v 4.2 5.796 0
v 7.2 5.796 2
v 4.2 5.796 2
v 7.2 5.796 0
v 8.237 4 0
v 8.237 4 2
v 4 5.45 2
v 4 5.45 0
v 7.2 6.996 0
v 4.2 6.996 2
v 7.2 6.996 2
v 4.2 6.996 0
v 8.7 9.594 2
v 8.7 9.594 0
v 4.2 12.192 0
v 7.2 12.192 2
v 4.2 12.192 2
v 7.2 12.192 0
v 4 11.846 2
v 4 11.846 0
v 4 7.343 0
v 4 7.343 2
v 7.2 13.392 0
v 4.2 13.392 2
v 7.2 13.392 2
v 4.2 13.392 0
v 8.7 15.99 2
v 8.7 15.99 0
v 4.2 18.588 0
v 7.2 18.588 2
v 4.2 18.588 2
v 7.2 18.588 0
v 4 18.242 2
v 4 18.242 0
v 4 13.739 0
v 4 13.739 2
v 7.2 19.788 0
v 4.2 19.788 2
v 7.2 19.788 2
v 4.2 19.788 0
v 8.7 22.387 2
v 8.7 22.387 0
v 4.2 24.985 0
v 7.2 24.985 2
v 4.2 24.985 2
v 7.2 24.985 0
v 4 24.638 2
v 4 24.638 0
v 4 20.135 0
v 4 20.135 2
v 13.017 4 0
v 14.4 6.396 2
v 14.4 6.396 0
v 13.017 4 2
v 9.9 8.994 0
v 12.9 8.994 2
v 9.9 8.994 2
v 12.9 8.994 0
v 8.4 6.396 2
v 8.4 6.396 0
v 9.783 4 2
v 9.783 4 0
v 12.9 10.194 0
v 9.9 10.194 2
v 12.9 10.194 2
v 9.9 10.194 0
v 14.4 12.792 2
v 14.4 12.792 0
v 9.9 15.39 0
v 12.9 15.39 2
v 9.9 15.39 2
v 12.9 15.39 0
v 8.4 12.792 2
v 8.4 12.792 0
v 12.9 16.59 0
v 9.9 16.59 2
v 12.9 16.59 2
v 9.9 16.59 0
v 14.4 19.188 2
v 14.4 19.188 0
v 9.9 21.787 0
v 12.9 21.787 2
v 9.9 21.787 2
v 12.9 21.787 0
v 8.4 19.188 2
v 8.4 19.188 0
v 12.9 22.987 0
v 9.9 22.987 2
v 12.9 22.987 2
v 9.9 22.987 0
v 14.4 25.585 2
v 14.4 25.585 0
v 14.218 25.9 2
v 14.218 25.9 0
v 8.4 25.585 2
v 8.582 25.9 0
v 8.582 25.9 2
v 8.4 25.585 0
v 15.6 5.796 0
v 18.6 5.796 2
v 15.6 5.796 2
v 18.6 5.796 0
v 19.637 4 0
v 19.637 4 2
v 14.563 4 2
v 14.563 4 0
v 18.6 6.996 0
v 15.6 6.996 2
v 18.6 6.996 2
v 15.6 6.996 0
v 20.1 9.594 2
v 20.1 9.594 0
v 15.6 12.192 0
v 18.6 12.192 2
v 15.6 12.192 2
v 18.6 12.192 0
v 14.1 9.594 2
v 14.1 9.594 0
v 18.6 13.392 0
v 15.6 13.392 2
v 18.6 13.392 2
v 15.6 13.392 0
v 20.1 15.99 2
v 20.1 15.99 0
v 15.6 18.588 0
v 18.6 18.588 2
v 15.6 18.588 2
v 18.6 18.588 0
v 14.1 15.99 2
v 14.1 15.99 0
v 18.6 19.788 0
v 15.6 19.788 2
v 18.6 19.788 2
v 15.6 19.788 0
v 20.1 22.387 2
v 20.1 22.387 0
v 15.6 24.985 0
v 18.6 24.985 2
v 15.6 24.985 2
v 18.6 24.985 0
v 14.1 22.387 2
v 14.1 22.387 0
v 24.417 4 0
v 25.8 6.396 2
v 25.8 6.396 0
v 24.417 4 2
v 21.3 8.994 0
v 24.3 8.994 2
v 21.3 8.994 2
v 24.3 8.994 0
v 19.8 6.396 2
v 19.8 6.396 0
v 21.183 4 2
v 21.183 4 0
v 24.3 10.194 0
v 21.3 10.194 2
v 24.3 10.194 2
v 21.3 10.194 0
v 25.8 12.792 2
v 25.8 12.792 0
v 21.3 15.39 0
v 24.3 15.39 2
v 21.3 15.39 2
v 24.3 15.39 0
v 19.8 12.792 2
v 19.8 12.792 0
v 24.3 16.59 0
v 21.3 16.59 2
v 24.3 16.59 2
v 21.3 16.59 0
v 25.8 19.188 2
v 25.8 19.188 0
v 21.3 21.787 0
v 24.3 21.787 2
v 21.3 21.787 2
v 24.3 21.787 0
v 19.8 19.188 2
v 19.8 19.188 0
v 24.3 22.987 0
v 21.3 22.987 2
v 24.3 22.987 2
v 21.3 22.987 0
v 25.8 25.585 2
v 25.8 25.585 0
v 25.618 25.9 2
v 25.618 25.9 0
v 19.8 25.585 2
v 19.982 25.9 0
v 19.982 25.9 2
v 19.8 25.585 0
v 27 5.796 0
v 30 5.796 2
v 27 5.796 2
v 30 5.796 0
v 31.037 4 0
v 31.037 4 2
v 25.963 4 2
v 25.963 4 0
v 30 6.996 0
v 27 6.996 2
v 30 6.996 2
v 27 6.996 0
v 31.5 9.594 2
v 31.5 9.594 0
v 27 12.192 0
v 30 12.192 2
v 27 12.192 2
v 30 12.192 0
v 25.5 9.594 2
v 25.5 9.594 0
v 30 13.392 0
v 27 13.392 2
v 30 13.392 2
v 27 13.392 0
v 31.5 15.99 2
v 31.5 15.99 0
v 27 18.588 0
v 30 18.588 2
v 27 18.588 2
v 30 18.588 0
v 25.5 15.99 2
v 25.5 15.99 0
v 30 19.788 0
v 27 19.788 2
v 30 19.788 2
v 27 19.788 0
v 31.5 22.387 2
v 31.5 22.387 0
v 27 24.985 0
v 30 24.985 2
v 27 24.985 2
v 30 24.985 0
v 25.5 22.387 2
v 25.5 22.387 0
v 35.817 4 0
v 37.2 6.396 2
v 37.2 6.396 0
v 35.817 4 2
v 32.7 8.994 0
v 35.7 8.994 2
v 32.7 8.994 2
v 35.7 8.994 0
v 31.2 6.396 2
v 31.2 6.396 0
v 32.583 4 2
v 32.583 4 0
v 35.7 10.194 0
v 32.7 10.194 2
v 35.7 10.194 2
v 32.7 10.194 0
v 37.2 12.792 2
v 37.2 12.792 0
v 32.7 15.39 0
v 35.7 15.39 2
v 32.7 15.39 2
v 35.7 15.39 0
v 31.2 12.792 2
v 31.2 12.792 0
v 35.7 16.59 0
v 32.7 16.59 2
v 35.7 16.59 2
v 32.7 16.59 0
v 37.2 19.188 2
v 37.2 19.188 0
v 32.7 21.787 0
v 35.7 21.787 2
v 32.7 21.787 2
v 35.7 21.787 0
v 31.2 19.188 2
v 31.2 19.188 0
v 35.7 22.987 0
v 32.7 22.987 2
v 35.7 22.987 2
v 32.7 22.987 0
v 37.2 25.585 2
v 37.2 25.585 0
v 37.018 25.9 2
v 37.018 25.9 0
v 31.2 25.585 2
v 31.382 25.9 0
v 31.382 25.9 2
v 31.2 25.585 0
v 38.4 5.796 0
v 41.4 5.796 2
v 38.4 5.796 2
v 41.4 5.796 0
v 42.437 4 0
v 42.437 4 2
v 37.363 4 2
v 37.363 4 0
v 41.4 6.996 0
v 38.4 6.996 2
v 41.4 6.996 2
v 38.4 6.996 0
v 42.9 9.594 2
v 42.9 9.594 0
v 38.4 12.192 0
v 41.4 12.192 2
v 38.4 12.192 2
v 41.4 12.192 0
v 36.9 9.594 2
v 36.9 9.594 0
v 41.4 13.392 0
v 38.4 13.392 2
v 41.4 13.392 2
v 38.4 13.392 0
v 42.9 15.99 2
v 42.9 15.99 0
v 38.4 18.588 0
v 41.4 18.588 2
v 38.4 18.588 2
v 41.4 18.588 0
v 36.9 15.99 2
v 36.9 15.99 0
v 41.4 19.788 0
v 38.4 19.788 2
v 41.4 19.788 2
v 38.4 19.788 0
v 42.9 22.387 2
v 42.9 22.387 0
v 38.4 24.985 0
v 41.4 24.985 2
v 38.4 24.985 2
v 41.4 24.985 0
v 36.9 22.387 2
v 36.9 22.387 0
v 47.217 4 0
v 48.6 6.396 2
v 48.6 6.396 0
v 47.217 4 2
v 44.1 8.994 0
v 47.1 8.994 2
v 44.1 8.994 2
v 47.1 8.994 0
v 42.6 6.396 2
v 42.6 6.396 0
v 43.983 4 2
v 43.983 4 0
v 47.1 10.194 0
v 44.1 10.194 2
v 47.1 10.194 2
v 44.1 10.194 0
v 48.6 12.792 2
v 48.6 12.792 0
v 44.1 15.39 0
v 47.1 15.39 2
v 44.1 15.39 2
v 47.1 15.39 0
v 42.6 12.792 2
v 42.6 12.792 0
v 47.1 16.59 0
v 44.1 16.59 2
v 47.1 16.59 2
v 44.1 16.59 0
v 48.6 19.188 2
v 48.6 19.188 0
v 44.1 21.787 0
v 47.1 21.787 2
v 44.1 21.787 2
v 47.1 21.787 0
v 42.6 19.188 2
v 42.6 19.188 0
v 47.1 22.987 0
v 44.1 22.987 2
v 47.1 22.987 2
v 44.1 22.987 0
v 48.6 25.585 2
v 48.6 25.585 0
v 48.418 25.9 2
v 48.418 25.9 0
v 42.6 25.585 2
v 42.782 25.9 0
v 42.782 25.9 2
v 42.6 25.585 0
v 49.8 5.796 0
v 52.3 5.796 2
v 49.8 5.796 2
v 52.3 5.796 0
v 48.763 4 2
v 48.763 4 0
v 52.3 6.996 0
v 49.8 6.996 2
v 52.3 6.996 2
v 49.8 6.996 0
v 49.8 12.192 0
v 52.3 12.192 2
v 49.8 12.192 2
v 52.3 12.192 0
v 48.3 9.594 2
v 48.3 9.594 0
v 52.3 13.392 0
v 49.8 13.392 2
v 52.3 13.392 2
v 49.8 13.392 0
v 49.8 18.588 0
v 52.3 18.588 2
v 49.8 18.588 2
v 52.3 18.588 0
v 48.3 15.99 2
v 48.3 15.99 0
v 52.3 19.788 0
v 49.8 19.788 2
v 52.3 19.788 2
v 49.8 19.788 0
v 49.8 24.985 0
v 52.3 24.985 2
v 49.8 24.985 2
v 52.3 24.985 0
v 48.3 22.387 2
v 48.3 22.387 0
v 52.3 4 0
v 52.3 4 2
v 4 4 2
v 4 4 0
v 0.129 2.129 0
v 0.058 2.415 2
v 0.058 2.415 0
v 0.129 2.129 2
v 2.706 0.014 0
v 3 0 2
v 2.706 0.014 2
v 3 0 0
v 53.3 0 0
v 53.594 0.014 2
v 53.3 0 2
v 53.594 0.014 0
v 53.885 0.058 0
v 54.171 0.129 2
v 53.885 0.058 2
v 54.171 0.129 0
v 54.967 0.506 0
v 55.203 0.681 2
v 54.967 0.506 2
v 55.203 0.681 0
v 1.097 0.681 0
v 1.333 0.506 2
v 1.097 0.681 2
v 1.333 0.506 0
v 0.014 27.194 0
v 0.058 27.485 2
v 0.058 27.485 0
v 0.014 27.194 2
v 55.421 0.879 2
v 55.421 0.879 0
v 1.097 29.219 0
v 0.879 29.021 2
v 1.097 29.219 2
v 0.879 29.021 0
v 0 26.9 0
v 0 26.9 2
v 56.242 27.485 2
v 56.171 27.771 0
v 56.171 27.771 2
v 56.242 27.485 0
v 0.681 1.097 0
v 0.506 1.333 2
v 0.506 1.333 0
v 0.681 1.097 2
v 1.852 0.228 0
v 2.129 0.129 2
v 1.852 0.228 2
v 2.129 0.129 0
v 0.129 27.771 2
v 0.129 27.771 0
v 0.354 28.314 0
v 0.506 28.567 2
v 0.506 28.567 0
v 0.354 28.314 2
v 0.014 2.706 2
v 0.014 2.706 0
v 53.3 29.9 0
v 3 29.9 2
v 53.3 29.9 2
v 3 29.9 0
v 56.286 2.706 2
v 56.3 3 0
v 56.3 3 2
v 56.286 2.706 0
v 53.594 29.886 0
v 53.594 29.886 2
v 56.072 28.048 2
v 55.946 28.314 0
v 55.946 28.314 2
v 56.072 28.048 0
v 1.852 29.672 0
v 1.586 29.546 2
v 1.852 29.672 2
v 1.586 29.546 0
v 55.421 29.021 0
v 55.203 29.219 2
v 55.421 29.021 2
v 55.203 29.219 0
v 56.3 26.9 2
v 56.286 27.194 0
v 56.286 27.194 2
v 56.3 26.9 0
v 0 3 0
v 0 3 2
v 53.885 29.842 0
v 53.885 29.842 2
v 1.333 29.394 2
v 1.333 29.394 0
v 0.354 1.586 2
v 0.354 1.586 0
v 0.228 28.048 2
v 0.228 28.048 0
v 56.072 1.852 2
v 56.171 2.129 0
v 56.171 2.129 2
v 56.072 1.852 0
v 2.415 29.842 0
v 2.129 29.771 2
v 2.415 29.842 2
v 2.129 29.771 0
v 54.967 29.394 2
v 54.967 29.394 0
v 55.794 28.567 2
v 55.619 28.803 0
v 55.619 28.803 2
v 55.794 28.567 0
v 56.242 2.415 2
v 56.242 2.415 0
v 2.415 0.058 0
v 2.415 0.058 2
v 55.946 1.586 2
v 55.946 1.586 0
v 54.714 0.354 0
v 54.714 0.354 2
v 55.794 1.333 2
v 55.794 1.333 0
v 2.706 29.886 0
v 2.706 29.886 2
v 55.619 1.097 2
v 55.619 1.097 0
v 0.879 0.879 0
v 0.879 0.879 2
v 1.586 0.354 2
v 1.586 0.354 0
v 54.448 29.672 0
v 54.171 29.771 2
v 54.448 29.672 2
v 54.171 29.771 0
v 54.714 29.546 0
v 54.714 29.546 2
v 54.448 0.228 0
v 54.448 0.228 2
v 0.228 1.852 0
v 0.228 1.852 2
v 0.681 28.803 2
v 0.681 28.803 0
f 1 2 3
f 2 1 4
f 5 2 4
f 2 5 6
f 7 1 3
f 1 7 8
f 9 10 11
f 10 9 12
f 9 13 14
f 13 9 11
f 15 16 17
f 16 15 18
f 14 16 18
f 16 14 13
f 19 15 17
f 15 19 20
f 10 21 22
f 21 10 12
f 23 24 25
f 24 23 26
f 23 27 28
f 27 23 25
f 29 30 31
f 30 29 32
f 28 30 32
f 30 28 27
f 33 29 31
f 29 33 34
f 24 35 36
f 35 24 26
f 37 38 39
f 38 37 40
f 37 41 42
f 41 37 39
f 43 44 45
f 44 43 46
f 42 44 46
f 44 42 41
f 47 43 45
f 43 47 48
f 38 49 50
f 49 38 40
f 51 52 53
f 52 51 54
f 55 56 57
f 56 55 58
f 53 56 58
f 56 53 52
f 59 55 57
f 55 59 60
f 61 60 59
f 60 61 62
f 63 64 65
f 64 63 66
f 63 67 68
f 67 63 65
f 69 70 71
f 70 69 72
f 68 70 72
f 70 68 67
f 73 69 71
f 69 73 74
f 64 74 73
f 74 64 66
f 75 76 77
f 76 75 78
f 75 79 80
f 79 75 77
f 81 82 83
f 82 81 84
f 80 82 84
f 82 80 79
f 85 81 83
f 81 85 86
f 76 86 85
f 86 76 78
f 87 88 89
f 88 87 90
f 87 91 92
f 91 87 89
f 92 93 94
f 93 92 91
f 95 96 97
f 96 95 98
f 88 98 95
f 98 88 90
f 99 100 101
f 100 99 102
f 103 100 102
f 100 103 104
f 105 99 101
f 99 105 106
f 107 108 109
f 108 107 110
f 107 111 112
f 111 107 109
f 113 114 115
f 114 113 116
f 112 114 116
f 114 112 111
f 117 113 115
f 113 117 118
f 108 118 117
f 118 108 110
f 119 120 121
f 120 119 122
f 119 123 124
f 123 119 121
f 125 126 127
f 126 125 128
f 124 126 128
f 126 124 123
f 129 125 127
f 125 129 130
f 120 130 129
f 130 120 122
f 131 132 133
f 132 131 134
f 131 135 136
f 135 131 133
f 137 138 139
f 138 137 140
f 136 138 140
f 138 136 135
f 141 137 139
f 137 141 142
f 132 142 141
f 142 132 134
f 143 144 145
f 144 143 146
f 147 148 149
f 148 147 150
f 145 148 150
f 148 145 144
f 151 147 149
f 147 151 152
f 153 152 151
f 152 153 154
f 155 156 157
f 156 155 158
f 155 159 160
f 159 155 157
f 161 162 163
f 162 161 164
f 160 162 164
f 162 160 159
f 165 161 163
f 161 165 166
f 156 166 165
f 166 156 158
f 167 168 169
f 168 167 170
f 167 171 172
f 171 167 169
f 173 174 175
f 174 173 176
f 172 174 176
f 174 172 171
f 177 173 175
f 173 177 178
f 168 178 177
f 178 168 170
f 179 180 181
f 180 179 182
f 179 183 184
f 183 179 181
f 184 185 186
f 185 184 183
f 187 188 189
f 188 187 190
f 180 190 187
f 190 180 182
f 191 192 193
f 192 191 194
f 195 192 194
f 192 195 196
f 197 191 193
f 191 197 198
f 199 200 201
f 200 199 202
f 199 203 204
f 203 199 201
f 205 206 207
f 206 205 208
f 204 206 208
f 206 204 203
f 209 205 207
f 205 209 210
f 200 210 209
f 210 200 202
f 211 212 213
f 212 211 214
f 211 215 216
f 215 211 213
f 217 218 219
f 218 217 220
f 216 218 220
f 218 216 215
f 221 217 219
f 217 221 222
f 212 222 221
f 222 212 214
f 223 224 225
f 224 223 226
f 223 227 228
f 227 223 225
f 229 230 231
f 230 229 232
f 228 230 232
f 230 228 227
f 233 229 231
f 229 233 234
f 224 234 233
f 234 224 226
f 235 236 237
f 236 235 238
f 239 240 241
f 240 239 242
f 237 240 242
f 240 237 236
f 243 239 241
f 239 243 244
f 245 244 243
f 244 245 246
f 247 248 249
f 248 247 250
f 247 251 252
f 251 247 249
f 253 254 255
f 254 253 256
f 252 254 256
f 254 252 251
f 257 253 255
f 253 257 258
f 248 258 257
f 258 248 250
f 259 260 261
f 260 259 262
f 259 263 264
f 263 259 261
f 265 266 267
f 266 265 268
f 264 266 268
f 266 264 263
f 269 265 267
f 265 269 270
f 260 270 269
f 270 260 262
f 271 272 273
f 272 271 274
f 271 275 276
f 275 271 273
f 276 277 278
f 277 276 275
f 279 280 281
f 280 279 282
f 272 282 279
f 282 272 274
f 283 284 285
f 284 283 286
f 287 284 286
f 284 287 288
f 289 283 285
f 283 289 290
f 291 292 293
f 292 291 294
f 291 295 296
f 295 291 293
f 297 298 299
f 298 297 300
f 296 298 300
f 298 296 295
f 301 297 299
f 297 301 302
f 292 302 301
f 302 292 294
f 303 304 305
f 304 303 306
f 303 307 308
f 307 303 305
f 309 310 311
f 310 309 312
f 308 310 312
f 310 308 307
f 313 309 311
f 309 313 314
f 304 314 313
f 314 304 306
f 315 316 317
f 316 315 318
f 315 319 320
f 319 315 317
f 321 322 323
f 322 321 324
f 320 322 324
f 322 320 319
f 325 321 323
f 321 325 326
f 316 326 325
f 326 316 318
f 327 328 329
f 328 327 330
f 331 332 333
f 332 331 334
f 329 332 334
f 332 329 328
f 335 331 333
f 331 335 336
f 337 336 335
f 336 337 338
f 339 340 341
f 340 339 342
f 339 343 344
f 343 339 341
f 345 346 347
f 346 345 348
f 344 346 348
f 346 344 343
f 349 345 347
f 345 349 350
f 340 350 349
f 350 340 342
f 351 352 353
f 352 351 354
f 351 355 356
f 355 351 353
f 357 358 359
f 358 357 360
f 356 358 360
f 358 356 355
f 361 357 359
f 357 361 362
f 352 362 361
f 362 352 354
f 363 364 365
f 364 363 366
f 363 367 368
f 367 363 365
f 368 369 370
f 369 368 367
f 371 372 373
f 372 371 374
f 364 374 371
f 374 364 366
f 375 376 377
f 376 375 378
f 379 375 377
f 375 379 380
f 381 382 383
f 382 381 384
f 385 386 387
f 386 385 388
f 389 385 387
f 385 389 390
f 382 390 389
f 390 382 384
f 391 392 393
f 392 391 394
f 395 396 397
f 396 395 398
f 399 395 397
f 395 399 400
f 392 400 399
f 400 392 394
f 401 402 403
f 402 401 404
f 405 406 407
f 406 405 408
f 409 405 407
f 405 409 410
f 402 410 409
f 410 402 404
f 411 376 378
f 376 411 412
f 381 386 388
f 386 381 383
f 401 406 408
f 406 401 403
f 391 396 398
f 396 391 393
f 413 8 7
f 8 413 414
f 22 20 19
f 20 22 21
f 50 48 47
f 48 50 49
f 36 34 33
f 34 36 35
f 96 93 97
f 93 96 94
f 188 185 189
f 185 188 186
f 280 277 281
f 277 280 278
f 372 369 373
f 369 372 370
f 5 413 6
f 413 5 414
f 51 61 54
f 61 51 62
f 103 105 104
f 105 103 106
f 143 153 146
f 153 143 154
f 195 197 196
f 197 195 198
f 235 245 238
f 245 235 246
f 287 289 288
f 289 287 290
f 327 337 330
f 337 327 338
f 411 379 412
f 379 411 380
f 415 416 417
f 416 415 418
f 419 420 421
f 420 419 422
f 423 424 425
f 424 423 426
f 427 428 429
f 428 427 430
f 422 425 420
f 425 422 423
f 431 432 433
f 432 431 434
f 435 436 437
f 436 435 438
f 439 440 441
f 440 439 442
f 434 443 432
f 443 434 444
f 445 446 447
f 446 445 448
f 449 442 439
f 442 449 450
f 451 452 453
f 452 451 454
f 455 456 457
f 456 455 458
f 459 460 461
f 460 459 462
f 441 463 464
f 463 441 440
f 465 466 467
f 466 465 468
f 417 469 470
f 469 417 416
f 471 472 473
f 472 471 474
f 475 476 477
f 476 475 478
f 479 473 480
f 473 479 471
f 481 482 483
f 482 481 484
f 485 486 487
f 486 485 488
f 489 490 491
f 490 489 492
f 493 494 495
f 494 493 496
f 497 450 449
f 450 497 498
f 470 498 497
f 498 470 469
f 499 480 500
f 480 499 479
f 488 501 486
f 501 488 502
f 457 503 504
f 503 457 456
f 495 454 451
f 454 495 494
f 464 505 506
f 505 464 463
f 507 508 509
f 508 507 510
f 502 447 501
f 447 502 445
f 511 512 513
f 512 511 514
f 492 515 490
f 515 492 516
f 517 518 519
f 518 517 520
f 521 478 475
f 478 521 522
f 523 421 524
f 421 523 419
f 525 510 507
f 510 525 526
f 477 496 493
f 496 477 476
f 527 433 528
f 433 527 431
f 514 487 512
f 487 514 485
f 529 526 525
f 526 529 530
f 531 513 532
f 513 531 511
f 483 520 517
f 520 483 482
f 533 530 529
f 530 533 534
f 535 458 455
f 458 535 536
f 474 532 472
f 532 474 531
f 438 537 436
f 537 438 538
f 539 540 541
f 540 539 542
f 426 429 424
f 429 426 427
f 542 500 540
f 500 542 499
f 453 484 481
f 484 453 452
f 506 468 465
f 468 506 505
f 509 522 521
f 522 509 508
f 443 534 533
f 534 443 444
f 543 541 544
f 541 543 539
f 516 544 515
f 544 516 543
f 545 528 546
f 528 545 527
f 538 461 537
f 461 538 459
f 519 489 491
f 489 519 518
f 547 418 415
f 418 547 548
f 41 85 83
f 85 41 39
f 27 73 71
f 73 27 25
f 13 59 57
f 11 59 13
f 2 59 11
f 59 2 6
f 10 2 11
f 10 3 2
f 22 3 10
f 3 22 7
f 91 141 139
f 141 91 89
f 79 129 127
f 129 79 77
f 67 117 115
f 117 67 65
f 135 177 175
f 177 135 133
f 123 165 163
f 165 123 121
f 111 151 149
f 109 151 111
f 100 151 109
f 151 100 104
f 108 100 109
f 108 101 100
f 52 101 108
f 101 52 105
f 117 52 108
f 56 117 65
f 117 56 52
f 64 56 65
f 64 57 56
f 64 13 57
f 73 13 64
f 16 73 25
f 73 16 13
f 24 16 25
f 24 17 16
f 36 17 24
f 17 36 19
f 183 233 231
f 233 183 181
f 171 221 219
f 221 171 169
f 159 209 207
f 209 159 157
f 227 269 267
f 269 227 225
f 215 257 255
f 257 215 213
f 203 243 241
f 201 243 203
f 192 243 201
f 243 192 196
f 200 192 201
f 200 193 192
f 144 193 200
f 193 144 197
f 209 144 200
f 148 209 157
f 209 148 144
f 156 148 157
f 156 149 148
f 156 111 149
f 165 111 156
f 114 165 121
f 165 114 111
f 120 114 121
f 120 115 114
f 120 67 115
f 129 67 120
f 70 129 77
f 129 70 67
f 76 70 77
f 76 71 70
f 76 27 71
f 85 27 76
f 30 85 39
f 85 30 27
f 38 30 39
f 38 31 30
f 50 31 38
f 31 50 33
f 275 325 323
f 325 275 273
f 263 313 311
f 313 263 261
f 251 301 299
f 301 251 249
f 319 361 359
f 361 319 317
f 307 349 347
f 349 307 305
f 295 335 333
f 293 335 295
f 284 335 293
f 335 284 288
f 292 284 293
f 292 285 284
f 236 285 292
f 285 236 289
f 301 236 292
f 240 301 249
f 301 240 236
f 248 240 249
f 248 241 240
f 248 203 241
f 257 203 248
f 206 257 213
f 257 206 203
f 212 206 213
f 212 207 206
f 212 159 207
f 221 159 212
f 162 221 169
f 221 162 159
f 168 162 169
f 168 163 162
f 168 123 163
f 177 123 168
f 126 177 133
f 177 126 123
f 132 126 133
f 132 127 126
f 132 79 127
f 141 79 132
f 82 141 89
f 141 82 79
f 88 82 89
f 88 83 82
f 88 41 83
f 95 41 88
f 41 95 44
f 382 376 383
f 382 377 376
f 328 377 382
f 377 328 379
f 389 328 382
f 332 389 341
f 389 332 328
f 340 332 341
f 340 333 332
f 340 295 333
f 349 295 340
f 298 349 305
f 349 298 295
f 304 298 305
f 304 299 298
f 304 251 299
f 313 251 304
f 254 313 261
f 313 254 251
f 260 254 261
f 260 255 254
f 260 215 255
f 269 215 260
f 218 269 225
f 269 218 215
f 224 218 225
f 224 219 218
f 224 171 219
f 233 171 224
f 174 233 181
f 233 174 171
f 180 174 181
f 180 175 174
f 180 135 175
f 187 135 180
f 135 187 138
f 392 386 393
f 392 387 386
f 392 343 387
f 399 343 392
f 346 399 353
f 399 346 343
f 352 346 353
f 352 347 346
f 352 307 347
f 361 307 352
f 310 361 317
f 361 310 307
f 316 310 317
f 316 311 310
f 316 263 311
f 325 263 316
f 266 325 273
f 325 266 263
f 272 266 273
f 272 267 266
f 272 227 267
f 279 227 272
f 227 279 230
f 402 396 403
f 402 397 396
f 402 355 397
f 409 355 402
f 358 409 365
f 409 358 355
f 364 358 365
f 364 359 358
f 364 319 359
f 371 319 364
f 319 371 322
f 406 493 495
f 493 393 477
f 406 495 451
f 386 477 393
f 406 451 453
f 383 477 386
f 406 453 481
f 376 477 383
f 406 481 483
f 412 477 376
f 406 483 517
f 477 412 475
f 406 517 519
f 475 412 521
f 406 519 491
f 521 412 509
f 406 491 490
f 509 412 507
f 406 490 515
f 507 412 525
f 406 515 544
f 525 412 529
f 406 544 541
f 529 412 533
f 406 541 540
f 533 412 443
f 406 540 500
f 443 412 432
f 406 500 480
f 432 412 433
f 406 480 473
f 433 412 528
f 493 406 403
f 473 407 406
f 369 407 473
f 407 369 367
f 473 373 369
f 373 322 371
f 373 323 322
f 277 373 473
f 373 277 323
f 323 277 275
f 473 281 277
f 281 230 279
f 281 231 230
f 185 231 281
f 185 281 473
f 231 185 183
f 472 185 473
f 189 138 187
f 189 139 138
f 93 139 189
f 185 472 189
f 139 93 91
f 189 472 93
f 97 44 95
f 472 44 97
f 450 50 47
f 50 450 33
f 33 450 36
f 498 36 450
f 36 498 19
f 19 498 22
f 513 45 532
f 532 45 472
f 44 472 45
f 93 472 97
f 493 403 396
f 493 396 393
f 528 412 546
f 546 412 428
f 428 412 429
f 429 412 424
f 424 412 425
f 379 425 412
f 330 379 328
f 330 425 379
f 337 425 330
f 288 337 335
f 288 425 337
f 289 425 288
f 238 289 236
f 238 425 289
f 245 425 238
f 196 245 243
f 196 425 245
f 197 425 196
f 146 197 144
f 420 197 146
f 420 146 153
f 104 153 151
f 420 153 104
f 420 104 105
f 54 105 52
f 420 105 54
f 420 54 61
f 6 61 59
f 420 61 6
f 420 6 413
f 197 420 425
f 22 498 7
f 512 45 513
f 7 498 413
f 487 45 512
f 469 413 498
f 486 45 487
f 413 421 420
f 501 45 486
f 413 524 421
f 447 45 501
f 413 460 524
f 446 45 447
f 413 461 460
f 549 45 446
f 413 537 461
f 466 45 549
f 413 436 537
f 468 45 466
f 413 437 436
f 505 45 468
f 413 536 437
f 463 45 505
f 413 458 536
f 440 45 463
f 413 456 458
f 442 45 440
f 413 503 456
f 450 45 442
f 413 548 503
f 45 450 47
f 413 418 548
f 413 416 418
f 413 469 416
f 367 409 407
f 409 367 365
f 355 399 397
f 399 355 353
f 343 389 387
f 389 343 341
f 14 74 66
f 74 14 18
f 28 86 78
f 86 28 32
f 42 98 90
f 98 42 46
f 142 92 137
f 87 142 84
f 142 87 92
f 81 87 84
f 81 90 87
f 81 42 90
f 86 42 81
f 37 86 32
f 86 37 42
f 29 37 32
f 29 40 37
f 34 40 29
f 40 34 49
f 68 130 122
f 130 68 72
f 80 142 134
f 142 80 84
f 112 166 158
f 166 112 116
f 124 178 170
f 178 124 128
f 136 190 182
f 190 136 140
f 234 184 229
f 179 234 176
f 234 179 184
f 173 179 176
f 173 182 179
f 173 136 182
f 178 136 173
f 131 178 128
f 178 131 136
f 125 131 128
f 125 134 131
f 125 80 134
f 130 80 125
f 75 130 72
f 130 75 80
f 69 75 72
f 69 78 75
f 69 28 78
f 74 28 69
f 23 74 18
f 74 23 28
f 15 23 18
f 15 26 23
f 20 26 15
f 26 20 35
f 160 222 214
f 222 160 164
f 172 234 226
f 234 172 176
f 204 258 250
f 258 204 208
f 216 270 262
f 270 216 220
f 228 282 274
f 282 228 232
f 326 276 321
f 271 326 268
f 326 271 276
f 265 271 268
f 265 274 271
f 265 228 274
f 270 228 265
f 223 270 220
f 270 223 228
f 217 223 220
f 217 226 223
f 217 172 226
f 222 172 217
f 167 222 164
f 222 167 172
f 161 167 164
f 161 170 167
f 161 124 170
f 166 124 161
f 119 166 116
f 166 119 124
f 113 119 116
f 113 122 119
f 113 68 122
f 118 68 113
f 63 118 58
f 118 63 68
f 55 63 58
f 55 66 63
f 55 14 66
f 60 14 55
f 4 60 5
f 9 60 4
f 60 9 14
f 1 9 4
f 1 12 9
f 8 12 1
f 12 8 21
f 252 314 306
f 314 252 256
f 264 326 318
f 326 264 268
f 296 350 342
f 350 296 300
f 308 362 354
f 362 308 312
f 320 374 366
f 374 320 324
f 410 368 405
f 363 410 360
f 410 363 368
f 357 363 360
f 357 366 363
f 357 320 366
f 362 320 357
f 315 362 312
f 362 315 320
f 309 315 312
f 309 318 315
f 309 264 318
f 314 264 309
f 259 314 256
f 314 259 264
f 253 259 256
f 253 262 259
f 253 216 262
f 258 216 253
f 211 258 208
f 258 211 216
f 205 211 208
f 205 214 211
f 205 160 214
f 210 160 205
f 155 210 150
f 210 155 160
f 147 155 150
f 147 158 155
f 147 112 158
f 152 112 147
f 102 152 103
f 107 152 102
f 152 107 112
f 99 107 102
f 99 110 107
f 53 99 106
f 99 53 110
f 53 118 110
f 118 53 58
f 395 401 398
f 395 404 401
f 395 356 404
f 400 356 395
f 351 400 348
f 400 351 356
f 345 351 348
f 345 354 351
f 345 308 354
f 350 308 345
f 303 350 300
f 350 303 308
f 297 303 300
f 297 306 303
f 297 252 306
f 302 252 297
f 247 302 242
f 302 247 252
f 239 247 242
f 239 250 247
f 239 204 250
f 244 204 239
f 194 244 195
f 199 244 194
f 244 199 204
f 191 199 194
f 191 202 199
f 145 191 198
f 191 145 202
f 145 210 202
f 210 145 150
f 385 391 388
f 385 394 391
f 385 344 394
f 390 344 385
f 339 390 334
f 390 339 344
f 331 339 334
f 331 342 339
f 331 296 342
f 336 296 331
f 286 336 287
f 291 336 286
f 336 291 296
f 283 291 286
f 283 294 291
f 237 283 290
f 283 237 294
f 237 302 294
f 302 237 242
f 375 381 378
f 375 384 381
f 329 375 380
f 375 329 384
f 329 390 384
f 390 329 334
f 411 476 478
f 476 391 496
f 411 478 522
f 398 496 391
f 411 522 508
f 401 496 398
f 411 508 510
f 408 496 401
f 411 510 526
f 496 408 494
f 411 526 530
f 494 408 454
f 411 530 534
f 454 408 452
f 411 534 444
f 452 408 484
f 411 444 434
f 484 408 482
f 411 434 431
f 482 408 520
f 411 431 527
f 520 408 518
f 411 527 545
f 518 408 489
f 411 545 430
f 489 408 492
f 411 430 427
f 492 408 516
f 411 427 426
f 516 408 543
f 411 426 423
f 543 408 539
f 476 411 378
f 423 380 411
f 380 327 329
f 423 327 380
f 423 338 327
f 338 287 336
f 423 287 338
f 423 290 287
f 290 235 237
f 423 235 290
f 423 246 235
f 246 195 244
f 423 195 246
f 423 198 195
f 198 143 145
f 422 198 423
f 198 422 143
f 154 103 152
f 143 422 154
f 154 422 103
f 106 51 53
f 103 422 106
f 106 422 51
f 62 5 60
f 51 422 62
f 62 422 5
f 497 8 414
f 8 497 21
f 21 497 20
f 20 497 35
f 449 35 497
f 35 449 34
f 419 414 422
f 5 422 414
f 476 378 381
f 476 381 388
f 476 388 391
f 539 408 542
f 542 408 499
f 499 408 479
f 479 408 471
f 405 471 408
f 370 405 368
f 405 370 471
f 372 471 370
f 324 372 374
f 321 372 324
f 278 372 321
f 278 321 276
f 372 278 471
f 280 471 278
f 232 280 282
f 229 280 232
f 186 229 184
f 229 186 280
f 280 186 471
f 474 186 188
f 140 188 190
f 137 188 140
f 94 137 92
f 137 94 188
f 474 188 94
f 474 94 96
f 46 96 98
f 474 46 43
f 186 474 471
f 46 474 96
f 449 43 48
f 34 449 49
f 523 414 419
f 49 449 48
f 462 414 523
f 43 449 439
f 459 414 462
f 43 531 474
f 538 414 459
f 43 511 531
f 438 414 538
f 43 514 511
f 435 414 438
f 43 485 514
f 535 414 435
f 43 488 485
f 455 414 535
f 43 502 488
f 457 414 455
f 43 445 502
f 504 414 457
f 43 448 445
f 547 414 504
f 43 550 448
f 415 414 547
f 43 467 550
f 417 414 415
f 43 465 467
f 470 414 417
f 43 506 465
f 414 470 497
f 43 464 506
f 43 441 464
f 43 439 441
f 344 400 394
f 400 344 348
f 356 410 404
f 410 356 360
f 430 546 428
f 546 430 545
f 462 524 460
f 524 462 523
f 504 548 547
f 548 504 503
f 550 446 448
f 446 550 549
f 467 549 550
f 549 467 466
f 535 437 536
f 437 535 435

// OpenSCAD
// Honeycomb panel prototype — to choose cell size / density for the case back.
// Reusable: the hex_panel() module gets lifted into the real back cover later.
// Render a density with:  openscad -D hole_r=4.5 ...

W        = 56.3;   // back-cover-ish width
H        = 29.9;   // back-cover-ish height
th       = 2;      // panel thickness
hole_r   = 3;      // hex hole circumradius — CHOSEN: fine/small hexes (override with -D hole_r=..)
rib      = 1.2;    // wall left between holes
border   = 4;      // solid frame around the edge
corner_r = 3;

$fn = 64;

module rrect(w, d, r) {
    hull() {
        translate([r,     r    ]) circle(r);
        translate([w - r, r    ]) circle(r);
        translate([r,     d - r]) circle(r);
        translate([w - r, d - r]) circle(r);
    }
}

module hex_holes(w, h, R, gap, t) {
    dx = 1.5 * R + gap;
    dy = sqrt(3) * R + gap;
    for (i = [-1 : ceil(w / dx) + 1])
        for (j = [-1 : ceil(h / dy) + 1]) {
            x = i * dx;
            y = j * dy + ((i % 2 != 0) ? dy / 2 : 0);
            translate([x, y, -1]) cylinder(h = t + 2, r = R, $fn = 6);
        }
}

// A flat panel with a clipped honeycomb field (solid border kept).
module hex_panel(w, h, t, R, gap, b) {
    difference() {
        linear_extrude(t) rrect(w, h, corner_r);
        intersection() {
            hex_holes(w, h, R, gap, t);
            translate([b, b, -1]) cube([w - 2*b, h - 2*b, t + 2]);
        }
    }
}

hex_panel(W, H, th, hole_r, rib, border);
